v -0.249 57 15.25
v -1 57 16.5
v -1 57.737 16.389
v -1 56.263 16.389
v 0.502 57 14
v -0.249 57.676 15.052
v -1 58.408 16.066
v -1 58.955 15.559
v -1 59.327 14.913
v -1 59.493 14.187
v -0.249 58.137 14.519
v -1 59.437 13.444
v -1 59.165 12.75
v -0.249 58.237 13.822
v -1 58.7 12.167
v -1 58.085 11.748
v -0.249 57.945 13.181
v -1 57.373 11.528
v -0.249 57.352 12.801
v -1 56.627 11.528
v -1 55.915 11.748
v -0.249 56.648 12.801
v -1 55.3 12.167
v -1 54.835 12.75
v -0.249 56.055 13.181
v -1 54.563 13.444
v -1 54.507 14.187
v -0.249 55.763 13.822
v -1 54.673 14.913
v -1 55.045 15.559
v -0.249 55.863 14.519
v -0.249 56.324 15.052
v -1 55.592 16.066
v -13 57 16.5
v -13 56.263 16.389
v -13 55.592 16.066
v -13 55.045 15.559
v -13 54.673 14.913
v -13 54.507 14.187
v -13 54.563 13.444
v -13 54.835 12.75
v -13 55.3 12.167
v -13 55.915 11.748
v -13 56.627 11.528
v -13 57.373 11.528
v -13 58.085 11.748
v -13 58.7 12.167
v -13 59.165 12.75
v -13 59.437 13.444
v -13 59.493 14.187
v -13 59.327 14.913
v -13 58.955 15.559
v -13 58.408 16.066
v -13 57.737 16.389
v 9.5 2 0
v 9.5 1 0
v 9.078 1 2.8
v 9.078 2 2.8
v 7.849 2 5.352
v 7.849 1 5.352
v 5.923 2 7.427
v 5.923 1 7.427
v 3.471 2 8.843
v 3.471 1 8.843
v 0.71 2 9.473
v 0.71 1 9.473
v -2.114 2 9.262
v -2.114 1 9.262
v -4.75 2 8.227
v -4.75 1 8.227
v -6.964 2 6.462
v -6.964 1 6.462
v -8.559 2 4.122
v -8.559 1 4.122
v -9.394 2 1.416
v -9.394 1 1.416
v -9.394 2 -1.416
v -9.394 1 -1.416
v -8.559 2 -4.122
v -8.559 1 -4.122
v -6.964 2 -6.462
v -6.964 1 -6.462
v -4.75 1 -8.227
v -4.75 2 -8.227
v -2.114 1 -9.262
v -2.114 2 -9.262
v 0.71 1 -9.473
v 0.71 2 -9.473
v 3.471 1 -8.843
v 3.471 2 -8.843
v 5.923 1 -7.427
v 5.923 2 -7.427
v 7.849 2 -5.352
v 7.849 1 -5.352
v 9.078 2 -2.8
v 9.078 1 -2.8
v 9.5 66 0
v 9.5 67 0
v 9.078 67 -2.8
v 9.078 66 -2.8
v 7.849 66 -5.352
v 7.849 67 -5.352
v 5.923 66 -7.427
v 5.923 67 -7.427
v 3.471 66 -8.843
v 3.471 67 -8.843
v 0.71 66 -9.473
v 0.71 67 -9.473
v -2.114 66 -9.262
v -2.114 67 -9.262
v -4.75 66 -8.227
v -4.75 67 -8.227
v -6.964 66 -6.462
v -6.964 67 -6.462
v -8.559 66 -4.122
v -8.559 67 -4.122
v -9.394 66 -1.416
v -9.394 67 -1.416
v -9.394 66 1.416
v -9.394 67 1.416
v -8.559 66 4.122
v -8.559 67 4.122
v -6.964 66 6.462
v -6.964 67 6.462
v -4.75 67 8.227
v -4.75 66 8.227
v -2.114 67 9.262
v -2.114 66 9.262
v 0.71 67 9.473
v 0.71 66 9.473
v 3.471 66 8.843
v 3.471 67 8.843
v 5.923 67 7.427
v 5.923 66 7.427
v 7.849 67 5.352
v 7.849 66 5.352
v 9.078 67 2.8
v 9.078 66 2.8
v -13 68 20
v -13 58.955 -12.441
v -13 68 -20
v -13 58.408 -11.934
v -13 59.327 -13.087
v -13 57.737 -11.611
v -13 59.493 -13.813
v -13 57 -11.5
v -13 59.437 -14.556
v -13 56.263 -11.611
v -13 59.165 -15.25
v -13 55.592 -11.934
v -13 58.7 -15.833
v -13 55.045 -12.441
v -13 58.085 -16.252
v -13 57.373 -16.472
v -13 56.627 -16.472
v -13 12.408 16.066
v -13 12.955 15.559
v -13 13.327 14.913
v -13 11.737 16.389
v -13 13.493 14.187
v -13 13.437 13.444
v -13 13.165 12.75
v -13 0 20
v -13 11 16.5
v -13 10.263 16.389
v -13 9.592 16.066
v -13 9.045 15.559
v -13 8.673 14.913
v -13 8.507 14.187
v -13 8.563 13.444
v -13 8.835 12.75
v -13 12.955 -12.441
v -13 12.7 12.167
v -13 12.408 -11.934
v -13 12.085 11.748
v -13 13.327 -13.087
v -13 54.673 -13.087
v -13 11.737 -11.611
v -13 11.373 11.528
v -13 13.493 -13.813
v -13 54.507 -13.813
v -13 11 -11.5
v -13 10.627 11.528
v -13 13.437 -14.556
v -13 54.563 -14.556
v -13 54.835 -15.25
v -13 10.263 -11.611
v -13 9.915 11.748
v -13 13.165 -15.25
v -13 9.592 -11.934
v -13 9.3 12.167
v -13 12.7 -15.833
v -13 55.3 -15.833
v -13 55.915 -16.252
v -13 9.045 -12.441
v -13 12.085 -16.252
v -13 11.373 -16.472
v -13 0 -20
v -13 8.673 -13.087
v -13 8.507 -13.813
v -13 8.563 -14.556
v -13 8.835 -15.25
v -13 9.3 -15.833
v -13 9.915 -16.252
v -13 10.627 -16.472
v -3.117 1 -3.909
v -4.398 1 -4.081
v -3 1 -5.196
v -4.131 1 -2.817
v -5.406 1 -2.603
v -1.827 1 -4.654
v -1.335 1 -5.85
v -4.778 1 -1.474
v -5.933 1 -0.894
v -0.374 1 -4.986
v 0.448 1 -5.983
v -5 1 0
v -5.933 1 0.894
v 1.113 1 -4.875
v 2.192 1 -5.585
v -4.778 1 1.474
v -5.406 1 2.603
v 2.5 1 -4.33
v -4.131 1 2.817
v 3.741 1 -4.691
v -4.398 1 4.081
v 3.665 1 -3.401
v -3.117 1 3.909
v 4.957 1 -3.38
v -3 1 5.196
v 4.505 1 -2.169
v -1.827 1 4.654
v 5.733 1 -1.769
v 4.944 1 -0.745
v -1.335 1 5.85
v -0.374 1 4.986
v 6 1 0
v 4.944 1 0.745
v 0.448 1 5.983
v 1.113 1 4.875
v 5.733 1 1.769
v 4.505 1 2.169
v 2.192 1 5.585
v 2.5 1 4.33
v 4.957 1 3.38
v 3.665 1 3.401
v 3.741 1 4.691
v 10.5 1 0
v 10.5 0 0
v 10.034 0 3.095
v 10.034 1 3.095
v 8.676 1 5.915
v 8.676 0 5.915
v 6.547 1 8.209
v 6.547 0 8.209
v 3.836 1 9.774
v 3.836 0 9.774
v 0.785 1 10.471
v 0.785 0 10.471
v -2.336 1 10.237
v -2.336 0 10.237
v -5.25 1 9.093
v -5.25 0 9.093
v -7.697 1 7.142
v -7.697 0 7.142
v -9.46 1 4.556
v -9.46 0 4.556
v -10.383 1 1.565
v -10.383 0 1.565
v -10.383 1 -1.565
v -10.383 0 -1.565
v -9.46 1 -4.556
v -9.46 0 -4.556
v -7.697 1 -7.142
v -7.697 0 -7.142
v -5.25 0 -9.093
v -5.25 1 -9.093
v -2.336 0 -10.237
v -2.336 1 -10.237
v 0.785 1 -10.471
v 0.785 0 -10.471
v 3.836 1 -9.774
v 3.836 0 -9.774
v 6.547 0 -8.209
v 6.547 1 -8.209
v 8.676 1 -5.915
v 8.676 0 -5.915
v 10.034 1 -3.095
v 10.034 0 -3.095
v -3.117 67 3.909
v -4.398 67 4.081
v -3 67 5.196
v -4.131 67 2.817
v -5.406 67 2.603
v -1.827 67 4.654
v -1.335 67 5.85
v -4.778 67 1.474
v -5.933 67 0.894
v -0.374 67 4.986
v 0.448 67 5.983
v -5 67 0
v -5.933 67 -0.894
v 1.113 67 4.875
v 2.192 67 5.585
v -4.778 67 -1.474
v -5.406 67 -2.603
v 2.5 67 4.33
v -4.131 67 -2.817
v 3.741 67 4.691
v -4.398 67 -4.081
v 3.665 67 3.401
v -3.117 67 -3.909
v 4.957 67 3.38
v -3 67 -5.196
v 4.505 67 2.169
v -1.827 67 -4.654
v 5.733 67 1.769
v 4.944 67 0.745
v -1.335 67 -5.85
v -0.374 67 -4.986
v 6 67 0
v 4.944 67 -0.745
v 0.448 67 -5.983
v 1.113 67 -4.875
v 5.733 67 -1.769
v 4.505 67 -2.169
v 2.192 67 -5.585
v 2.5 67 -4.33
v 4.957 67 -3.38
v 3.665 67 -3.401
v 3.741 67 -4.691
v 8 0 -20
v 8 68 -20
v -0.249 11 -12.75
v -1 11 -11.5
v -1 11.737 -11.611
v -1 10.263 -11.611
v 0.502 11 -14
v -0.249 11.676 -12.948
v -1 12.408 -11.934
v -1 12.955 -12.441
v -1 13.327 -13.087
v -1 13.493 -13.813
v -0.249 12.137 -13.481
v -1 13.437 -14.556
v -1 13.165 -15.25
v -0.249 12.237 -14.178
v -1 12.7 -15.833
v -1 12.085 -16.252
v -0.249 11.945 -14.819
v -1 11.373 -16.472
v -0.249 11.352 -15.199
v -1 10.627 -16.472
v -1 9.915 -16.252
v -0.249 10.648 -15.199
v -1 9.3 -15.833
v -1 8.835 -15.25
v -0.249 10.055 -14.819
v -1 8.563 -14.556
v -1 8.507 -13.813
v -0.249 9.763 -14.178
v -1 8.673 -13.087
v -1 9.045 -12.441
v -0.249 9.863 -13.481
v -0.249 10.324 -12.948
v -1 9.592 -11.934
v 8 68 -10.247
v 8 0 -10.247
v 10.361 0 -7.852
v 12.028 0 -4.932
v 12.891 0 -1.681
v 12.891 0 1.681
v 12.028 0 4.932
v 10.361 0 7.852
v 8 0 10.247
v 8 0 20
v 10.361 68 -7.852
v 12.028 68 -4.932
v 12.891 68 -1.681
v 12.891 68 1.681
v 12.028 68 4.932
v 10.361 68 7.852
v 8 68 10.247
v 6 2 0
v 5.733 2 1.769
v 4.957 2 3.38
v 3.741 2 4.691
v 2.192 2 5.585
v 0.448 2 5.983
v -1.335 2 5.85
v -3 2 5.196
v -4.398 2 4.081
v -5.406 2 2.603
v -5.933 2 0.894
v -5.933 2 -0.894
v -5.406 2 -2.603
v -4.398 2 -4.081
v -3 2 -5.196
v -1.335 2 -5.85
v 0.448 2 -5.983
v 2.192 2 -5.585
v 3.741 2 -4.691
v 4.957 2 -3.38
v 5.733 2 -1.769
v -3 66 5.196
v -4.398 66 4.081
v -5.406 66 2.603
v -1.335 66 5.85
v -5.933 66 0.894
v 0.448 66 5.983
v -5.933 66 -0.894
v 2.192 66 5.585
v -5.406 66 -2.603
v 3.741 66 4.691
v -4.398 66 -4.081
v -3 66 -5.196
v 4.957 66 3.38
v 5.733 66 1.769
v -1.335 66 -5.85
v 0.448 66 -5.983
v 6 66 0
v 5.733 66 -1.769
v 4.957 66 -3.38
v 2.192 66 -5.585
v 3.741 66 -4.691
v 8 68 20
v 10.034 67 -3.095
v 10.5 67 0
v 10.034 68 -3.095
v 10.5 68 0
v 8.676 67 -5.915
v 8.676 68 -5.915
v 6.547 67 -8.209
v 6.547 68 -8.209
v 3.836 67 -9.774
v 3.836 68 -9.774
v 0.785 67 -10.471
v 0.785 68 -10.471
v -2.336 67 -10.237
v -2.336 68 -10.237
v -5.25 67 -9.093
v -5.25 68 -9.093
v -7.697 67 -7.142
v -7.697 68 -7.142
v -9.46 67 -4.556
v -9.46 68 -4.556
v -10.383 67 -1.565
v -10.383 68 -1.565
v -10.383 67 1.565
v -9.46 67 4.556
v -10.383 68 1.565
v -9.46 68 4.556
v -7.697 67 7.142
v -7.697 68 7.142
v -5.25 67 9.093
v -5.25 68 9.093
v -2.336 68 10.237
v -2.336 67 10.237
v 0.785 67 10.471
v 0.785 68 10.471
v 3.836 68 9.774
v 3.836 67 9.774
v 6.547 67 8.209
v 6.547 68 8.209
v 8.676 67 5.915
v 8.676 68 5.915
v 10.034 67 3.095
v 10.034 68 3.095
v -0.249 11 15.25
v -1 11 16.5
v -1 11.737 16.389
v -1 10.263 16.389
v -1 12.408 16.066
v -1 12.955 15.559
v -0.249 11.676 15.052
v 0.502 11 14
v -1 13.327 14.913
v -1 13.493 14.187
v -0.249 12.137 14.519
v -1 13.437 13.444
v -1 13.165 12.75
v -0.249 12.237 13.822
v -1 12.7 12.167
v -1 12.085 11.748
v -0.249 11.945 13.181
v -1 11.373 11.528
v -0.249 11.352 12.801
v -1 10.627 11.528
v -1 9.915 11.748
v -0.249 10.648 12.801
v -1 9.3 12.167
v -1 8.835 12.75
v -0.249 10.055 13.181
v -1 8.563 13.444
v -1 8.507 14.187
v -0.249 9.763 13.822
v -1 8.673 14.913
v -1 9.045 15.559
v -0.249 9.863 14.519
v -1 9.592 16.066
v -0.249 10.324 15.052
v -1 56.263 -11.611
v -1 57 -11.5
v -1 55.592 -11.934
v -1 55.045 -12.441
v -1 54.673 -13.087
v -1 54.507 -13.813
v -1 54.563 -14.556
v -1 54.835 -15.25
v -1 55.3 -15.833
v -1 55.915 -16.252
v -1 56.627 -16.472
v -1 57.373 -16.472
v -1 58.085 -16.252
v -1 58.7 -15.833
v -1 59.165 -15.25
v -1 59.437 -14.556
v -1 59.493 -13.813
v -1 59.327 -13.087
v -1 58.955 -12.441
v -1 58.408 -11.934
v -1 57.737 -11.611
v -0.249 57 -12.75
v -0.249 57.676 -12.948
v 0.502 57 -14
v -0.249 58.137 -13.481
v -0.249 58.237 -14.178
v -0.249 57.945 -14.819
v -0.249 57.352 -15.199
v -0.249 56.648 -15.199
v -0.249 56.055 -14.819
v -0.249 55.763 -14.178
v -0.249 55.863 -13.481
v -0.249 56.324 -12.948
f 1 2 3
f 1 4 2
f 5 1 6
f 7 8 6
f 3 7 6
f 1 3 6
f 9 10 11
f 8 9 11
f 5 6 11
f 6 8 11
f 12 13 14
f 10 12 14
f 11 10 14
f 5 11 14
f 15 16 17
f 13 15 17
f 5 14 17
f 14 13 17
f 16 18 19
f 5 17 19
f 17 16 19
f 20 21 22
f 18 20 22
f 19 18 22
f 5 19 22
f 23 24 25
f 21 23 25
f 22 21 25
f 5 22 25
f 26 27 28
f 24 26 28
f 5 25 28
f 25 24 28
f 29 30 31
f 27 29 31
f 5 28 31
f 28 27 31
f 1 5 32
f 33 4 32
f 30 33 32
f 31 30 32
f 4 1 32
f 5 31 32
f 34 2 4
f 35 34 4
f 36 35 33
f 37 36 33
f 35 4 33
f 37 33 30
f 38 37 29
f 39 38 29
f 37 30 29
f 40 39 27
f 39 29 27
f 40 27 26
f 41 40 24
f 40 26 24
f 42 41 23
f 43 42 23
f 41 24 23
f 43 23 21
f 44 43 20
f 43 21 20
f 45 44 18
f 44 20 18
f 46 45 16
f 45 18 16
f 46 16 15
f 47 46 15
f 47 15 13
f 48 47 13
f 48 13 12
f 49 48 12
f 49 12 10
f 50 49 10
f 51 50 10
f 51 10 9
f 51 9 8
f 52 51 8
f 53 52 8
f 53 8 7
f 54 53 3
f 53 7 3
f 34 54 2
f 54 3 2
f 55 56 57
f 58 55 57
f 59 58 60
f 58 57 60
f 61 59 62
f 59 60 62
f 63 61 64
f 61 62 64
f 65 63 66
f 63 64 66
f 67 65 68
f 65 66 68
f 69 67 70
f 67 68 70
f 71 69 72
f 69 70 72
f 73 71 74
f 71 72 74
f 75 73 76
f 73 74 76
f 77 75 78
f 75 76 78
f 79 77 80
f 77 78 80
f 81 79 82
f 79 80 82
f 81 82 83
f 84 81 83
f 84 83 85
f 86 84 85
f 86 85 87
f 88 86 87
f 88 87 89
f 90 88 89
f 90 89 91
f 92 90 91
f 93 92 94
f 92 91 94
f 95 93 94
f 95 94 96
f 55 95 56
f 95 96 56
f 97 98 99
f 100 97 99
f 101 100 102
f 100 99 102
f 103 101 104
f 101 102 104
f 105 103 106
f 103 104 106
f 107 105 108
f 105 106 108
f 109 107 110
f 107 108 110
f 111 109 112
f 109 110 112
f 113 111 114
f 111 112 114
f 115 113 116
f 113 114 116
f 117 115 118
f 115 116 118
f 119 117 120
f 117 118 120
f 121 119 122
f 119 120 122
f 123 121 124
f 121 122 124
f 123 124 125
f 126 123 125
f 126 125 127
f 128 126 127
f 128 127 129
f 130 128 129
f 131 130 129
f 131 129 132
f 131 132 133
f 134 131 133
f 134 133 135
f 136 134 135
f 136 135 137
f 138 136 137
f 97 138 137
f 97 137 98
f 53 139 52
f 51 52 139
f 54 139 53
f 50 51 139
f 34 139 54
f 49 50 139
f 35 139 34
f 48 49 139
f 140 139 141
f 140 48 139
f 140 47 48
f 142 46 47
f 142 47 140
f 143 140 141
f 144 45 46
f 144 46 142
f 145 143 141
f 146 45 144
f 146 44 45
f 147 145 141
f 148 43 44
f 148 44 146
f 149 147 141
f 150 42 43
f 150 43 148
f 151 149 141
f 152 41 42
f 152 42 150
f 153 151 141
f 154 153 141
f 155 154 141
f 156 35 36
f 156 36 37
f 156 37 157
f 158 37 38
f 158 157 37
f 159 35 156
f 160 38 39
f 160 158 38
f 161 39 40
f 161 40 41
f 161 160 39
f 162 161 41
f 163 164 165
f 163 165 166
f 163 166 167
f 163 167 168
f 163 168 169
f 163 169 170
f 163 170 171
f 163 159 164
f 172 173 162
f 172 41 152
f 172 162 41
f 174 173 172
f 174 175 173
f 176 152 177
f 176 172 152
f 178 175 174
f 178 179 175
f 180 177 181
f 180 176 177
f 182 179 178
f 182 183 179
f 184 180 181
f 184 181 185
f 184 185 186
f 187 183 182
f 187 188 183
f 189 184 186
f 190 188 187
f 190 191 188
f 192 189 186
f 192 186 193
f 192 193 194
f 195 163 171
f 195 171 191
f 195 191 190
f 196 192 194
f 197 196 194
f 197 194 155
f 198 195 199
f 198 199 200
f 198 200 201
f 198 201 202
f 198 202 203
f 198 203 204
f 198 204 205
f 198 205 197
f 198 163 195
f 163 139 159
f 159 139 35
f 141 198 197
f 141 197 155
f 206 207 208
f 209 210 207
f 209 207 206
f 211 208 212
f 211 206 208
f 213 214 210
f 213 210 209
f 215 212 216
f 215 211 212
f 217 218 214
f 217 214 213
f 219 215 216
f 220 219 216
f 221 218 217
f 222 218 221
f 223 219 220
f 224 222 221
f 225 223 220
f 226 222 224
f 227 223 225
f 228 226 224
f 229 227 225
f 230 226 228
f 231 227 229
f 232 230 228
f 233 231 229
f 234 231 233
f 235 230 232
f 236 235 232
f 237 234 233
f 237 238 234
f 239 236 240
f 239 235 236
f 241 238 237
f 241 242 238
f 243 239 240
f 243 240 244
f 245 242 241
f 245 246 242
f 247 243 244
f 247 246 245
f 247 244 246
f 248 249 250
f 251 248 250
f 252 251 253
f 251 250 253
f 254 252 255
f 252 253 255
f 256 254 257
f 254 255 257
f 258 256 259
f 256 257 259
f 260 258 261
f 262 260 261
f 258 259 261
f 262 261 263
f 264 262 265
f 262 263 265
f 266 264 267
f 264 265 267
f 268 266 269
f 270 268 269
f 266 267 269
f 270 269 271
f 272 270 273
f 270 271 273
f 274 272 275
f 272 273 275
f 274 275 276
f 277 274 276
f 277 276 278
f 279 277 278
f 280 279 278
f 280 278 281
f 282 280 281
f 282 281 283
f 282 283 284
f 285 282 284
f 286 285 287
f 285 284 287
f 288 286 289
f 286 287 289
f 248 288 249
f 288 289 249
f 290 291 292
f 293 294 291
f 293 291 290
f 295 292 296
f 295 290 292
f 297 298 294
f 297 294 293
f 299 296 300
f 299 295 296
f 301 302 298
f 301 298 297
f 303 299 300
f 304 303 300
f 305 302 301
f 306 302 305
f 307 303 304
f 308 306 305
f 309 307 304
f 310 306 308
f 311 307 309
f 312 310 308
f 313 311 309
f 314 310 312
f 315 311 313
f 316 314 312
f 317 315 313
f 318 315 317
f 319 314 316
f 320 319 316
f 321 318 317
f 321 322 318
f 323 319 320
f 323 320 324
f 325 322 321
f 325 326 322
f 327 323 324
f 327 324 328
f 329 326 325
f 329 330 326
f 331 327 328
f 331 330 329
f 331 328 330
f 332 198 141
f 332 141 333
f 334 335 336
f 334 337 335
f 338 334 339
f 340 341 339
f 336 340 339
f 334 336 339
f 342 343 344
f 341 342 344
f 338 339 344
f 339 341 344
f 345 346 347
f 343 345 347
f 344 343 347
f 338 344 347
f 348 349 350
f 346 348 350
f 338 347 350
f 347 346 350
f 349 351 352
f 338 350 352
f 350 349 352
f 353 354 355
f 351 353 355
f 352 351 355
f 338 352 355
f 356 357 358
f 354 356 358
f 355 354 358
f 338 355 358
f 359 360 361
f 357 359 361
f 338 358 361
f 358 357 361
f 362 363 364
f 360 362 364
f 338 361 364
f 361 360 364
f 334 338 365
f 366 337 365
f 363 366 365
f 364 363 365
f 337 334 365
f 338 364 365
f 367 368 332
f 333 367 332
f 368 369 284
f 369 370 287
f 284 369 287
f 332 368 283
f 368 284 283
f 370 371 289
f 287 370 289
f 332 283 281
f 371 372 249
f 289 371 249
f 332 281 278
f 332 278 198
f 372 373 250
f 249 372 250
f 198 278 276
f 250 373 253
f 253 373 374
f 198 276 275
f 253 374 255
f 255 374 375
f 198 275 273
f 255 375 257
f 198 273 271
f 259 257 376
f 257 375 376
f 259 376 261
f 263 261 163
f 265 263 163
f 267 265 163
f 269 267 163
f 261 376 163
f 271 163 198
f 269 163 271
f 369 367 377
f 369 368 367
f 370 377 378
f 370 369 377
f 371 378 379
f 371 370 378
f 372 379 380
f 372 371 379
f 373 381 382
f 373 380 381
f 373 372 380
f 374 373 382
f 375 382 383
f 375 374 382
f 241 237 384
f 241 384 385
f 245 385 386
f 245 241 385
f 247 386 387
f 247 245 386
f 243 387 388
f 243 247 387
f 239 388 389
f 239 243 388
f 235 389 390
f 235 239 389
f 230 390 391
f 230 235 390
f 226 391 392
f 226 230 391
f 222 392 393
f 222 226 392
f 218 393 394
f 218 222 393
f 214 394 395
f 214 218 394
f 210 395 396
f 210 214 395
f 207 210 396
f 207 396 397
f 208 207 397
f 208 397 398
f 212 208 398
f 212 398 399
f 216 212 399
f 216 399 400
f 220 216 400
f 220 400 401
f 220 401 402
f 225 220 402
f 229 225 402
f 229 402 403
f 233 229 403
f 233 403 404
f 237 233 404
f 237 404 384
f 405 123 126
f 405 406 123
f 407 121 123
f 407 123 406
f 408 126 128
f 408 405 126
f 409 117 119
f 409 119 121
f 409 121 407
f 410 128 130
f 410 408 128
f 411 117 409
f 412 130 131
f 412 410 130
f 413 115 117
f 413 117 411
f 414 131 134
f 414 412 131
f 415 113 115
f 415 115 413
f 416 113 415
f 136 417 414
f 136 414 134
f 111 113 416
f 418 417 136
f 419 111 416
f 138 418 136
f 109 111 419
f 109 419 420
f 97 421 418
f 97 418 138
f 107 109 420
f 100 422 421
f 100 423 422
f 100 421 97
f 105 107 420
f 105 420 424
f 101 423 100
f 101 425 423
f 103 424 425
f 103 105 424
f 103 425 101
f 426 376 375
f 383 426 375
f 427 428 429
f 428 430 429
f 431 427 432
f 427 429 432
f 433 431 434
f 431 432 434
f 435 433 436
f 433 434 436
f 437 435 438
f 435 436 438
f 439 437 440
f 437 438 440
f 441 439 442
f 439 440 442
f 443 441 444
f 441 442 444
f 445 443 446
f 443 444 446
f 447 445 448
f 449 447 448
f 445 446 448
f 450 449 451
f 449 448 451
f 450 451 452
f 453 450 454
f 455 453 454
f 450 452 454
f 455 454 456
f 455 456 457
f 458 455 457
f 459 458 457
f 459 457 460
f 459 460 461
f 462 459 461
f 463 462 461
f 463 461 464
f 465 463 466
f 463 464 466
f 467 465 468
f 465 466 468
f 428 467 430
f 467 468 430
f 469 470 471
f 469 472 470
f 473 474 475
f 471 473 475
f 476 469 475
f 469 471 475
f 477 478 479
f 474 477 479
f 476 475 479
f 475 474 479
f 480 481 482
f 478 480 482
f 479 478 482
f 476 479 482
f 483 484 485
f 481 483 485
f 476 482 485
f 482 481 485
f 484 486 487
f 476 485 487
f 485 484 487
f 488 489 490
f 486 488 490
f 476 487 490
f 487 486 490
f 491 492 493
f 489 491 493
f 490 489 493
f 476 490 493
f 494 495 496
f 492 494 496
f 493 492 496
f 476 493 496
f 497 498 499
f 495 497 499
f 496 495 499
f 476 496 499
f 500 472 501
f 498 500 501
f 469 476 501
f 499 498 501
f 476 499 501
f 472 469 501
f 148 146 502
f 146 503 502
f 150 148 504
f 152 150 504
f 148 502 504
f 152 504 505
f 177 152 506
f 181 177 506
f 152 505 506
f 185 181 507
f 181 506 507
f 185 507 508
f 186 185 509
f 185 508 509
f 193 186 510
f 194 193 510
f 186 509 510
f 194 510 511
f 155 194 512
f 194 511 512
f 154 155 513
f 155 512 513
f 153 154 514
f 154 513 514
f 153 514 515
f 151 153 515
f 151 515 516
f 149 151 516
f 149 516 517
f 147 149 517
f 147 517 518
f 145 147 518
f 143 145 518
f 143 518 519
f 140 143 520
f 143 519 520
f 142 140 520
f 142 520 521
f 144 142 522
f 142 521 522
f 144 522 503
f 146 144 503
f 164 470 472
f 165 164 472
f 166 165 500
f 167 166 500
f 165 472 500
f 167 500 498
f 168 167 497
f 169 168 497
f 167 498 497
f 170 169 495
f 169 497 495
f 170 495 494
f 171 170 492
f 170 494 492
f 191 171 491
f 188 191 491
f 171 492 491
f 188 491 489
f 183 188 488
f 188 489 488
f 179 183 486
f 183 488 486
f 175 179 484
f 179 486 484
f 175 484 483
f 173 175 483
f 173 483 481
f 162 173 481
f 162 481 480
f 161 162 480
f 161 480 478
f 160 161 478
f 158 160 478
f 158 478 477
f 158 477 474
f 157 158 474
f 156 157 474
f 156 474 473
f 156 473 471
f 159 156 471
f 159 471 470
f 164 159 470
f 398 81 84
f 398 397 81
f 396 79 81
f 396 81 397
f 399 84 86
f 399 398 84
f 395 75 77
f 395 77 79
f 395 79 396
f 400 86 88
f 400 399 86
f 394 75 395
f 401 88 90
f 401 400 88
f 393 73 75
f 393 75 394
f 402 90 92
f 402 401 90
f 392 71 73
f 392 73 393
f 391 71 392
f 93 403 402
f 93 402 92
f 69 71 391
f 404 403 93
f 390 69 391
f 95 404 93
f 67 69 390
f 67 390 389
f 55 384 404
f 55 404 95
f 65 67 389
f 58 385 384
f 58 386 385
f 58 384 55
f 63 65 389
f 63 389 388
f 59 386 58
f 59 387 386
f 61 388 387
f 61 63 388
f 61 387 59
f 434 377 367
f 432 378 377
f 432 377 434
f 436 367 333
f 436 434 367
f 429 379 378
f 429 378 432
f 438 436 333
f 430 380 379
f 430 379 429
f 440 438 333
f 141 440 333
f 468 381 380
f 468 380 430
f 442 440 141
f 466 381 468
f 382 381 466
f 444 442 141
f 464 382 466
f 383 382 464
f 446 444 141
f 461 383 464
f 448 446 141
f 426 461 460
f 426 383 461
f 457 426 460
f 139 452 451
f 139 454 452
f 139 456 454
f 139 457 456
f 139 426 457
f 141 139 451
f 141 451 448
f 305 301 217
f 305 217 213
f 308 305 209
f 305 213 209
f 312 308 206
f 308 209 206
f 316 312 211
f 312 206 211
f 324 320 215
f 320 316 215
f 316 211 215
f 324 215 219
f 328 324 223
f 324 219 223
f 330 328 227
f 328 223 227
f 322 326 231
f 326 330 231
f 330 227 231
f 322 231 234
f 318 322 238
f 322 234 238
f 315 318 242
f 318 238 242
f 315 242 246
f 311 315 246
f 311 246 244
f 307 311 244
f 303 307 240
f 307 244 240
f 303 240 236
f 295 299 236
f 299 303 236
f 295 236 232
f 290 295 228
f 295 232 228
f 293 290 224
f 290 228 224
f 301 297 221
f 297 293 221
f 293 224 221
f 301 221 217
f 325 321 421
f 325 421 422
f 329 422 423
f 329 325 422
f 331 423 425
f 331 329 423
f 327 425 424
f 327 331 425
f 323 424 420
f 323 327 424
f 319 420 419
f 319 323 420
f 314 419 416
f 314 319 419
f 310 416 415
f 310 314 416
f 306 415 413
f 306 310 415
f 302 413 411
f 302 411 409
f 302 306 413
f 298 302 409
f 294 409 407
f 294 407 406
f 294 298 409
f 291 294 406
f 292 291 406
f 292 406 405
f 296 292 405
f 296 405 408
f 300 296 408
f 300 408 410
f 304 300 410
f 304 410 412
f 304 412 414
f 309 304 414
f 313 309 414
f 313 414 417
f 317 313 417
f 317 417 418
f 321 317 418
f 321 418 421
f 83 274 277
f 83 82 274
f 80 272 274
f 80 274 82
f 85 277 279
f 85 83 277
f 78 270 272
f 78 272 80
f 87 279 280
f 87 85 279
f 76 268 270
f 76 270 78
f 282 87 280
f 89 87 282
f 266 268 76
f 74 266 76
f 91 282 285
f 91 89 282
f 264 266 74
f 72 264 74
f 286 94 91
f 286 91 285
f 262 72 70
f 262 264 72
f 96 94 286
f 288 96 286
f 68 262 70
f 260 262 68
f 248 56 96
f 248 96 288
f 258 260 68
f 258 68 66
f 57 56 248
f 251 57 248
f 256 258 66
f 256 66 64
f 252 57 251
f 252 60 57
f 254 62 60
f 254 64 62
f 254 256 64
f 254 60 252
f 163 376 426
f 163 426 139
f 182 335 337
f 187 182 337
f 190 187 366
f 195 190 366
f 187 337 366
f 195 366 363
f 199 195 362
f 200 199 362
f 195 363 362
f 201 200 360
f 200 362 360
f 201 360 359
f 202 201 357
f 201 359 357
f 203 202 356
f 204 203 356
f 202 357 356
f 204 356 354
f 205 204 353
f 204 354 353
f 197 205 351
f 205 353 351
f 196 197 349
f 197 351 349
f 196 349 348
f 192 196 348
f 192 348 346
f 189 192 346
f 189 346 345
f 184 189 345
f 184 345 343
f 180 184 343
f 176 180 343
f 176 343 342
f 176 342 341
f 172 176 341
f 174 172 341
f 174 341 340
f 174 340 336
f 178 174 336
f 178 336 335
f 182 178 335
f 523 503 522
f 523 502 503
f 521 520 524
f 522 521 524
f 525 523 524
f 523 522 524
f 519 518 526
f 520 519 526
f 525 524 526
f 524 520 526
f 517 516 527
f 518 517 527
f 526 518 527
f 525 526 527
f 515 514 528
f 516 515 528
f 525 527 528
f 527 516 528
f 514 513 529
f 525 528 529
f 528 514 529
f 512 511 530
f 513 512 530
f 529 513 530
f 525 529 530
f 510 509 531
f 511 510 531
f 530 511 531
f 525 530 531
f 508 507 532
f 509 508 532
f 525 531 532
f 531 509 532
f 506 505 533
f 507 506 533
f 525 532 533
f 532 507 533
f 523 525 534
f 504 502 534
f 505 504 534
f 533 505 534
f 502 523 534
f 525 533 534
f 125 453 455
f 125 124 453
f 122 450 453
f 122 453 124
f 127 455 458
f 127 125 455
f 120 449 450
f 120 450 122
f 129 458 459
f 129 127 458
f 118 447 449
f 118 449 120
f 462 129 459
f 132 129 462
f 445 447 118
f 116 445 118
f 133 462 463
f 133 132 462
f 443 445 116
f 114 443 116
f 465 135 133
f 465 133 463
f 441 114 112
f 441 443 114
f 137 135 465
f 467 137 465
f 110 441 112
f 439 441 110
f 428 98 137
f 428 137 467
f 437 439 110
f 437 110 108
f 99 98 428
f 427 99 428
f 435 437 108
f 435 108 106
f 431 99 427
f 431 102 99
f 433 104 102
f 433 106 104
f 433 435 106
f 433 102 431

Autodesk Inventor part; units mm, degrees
ref_plane "YZ Plane" through (0, 0, 0) normal (1, 0, 0) x (0, 1, 0)
ref_plane "XZ Plane" through (0, 0, 0) normal (0, 1, 0) x (-1, 0, 0)
ref_plane "XY Plane" through (0, 0, 0) normal (0, 0, 1) x (1, 0, 0)
sketch "Szkic1" plane through (0, 0, 0) normal (0, 1, 0) x (-1, 0, 0)
  line L0 (-8, 20) -> (13, 20)
  line L1 (13, 20) -> (13, -20)
  line L2 (13, -20) -> (-8, -20)
  line L3 (-13, 20) -> (13, -20) construction
  line L4 (13, 20) -> (-13, -20) construction
  line L5 (13, 0) -> (0, 0)
  circle A0 centre (0, 0) radius 5
  line L6 (13, 20) -> (-8, 20)
  arc A1 (-8, 10.247) -> (-8, -10.247) centre (0, 0) ccw
  line L7 (-8, 20) -> (-8, 10.247)
  line L8 (-8, -10.247) -> (-8, -20)
  dimension "d0" = 26
  dimension "d1" = 40
  dimension "d2" = 10
  dimension "d3" = 21
extrude "Wyciągnięcie proste1" add sketch "Szkic1" along normal blind 68
sketch "Szkic2" plane through (0, 68, 0) normal (0, 1, 0) x (1, 0, 0)
  circle A0 centre (0, 0) radius 5 projected
  circle A1 centre (0, 0) radius 6
  circle A2 centre (0, 0) radius 10.5
  circle A3 centre (0, 0) radius 9.5
  dimension "d6" = 12
  dimension "d7" = 21
  dimension "d8" = 19
extrude "Wyciągnięcie proste2" cut sketch "Szkic2" against normal blind 1
sketch "Szkic3" plane through (0, 68, 0) normal (0, 1, 0) x (1, 0, 0)
  circle A0 centre (0, 0) radius 6 projected
  circle A1 centre (0, 0) radius 9.5 projected
extrude "Wyciągnięcie proste3" cut sketch "Szkic3" against normal blind 2
sketch "Szkic4" plane through (0, 0, 0) normal (0, -1, 0) x (1, 0, 0)
  circle A0 centre (0, 0) radius 5
  circle A1 centre (0, 0) radius 6
  circle A2 centre (0, 0) radius 10.5
  circle A3 centre (0, 0) radius 9.5
  dimension "d13" = 12
  dimension "d14" = 21
  dimension "d15" = 19
extrude "Wyciągnięcie proste4" cut sketch "Szkic4" against normal blind 1
sketch "Szkic5" plane through (0, 0, 0) normal (0, -1, 0) x (1, 0, 0)
  circle A0 centre (0, 0) radius 6 projected
  circle A1 centre (0, 0) radius 9.5 projected
extrude "Wyciągnięcie proste5" cut sketch "Szkic5" against normal blind 2
sketch "Szkic6" plane through (-13, 0, -20) normal (-1, 0, 0) x (0, 0, 1)
  line L0 (0, 0) -> (40, 0) projected
  line L1 (40, 0) -> (40, 68) projected
  line L2 (0, 68) -> (40, 68) projected
  line L3 (0, 0) -> (0, 68) projected
  line L4 (0, 68) -> (20, 68)
  line L5 (20, 68) -> (6, 68)
  line L6 (20, 68) -> (34, 68)
  line L7 (34, 68) -> (34, 0)
  line L8 (0, 0) -> (40, 0) projected
  line L9 (6, 68) -> (6, 0)
  line L10 (34, 68) -> (34, 34)
  line L11 (34, 34) -> (6, 34)
  line L12 (34, 34) -> (34, 57)
  line L13 (34, 57) -> (6, 57)
  line L14 (6, 34) -> (6, 11)
  line L15 (6, 11) -> (34, 11)
  point P0 (20, 0)
  dimension "d20" = 20
  dimension "d21" = 14
  dimension "d22" = 14
  dimension "d23" = 34
  dimension "d24" = 23
  dimension "d25" = 23
hole "Otwór1" at (-13, 57, -14) at (-13, 57, 14) at (-13, 11, -14) at (-13, 11, 14) direction (1, 0, 0) diameter 5 depth 12 tip angle 118
thread "Gwint1" size "M5x0.8" class "6H" standard "ANSI Metric M Profile" full length
thread "Gwint2" size "M5x0.8" class "6H" standard "ANSI Metric M Profile" full length
thread "Gwint3" size "M5x0.8" class "6H" standard "ANSI Metric M Profile" full length
thread "Gwint4" size "M5x0.8" class "6H" standard "ANSI Metric M Profile" full length
properties part number "Łożysko liniowe w obudowie SMAG10UU-L"
